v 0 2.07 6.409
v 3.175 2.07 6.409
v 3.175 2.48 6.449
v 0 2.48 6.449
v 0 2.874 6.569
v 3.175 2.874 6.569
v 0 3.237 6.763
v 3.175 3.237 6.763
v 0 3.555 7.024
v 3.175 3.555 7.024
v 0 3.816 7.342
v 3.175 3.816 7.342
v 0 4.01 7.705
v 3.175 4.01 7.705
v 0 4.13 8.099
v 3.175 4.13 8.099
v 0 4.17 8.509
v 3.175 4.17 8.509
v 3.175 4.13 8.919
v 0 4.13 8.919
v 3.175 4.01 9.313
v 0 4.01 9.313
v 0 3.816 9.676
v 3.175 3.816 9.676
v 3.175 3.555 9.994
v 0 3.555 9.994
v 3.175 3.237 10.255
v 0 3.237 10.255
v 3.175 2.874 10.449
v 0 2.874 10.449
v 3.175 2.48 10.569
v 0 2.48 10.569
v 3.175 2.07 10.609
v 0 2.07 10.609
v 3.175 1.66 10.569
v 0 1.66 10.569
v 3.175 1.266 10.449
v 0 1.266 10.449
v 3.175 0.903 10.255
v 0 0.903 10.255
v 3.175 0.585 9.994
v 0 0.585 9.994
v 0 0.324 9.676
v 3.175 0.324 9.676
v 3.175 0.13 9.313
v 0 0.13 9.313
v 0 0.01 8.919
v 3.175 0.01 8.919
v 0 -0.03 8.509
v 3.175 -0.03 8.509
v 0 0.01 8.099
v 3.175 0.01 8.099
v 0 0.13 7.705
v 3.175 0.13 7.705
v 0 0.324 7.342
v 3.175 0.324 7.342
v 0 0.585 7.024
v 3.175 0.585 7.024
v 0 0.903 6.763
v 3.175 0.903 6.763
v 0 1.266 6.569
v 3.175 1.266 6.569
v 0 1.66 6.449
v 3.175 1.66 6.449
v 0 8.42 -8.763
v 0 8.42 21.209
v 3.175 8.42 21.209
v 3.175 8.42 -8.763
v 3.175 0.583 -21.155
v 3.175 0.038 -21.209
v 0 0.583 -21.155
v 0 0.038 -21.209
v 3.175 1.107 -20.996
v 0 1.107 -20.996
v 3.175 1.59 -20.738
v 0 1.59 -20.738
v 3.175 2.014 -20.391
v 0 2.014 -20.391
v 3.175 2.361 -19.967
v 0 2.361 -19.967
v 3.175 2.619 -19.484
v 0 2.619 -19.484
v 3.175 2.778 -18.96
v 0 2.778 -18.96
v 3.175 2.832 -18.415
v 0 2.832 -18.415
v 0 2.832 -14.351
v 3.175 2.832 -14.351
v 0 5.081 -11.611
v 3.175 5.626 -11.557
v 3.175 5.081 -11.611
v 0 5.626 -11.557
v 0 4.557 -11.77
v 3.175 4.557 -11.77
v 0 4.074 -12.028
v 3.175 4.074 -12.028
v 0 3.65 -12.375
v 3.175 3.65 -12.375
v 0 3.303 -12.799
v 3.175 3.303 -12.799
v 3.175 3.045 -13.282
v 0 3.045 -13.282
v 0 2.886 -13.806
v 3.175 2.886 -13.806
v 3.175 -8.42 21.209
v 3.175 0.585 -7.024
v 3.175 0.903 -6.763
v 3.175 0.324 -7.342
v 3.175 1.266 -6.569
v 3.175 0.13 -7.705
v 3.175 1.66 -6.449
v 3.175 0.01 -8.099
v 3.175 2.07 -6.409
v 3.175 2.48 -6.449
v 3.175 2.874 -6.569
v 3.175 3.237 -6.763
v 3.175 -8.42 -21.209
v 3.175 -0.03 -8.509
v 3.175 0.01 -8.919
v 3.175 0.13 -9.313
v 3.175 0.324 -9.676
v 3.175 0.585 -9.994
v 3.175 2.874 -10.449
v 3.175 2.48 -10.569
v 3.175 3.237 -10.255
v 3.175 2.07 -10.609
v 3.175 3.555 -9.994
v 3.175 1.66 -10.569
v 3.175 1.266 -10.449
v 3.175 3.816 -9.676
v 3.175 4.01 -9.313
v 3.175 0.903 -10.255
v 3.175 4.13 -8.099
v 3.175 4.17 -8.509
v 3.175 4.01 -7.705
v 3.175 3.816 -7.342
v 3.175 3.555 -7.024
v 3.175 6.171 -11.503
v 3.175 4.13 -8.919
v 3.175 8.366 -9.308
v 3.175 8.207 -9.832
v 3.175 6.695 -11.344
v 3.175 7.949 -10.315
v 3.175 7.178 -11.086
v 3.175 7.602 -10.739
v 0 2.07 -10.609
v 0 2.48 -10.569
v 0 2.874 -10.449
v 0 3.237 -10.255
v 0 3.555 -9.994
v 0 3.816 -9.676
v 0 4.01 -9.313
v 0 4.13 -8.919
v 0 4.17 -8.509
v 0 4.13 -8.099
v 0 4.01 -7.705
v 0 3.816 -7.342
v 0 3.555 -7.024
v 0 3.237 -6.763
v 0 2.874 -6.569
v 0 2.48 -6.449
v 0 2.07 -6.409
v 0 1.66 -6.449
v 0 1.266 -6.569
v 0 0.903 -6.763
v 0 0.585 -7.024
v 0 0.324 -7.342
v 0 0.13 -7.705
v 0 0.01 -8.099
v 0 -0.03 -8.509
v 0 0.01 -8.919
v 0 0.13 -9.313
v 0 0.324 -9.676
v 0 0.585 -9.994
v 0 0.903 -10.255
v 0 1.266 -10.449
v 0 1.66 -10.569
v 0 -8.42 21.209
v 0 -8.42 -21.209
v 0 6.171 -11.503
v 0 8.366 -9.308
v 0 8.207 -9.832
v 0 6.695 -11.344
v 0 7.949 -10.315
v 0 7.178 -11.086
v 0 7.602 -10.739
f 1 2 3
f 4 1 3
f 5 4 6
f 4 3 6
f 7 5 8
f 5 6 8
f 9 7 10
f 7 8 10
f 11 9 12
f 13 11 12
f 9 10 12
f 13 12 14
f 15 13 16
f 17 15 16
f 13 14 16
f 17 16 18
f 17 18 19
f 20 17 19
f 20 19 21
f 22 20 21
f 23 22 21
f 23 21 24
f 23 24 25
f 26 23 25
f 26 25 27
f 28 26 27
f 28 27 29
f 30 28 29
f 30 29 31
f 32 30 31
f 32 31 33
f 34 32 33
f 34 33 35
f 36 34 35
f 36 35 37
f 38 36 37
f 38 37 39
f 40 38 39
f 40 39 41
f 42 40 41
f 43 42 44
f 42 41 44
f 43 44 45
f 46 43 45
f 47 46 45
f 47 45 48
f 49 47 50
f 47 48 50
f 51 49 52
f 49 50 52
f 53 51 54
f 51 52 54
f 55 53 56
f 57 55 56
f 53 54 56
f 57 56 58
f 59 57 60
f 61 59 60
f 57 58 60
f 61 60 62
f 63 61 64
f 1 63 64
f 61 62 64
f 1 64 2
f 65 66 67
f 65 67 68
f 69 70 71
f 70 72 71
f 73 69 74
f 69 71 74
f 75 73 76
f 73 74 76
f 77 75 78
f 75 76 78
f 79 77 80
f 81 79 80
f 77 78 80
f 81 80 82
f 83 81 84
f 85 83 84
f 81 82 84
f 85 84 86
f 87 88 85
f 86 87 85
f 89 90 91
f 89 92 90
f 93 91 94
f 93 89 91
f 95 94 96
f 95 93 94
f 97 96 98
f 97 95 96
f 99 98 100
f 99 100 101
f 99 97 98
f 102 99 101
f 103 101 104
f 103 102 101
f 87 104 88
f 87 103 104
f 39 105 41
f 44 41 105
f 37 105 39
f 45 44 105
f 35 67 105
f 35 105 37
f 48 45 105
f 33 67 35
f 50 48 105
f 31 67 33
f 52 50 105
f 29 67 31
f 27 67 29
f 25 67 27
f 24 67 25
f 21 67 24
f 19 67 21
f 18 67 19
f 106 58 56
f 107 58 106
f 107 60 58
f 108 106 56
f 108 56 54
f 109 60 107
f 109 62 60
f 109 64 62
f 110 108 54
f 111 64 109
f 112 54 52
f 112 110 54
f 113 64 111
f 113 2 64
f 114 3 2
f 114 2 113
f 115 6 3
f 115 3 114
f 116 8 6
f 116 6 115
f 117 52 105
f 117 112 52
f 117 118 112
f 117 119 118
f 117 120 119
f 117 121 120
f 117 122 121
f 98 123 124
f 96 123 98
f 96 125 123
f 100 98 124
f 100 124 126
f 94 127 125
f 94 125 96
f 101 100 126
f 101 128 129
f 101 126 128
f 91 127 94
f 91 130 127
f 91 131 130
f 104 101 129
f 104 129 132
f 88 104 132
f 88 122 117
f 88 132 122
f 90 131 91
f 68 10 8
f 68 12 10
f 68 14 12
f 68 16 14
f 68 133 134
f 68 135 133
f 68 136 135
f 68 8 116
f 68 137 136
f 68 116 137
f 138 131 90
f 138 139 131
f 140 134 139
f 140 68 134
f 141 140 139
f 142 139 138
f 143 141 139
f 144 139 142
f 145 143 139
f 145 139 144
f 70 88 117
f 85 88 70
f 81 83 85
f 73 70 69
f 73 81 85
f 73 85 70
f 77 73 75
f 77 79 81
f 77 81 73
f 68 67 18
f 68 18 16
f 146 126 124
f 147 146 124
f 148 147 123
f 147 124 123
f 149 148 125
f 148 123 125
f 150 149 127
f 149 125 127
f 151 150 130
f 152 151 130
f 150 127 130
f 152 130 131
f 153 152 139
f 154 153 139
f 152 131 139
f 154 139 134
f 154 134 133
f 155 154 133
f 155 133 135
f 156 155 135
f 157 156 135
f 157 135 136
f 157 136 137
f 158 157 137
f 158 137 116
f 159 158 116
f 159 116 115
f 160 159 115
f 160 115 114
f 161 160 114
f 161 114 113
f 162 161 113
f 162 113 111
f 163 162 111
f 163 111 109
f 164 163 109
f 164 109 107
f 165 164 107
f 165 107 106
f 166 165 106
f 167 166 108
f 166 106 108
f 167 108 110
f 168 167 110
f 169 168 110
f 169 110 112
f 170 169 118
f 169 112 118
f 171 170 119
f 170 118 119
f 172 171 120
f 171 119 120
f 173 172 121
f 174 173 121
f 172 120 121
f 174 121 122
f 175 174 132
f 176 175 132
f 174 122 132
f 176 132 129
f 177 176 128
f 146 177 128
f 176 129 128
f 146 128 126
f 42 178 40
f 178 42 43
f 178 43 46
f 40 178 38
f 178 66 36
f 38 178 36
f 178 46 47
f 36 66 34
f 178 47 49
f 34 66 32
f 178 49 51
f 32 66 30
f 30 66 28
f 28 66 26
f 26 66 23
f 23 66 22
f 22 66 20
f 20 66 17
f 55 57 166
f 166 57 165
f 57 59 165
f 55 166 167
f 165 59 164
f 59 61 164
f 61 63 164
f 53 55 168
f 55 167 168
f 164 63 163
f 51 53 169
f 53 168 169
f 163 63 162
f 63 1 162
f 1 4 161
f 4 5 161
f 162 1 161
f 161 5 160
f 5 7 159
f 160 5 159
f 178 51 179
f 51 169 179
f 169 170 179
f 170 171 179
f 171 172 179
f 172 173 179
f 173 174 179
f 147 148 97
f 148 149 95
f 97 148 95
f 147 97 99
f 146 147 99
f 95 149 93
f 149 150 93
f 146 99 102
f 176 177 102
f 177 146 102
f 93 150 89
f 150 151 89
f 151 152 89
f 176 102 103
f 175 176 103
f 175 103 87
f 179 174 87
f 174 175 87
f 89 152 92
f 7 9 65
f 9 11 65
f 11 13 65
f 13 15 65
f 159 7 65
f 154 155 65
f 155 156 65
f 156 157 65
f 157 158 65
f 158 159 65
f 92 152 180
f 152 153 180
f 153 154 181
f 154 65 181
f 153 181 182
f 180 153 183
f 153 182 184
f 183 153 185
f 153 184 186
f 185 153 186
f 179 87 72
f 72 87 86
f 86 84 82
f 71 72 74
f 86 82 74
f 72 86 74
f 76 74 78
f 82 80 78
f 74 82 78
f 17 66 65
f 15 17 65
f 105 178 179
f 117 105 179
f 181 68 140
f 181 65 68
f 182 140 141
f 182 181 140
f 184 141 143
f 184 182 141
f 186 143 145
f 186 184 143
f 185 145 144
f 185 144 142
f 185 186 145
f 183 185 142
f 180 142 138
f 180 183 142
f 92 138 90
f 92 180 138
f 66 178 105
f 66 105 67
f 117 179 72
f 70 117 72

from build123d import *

# Parameters (mm, degrees)
SKETCH1_W           = 42.418
SKETCH1_H           = 16.8402
BOSS_EXTRUDE1_DEPTH = 3.175
SKETCH3_R           = 2.1
CUT_EXTRUDE1_DEPTH  = 24.039105669
SKETCH4_W           = 9.652
SKETCH4_H           = 5.588
CUT_EXTRUDE2_DEPTH  = 24.039105669
FILLET1_R           = 2.794


with BuildPart() as part:
    # Sketch1 → Boss-Extrude1 (new body)
    with BuildSketch(Plane(origin=(0, 0, 0), x_dir=(0, 0, -1), z_dir=(1, 0, 0))):
        Rectangle(SKETCH1_W, SKETCH1_H)
    extrude(amount=BOSS_EXTRUDE1_DEPTH)

    # Sketch3 → Cut-Extrude1 (cut, through all)
    with BuildSketch(Plane(origin=(3.175, 0, 0), x_dir=(0, 0, -1), z_dir=(1, 0, 0))):
        with Locations((-8.509, 2.0701)):
            Circle(SKETCH3_R)
        with Locations((8.509, 2.0701)):
            Circle(SKETCH3_R)
    extrude(amount=-CUT_EXTRUDE1_DEPTH, mode=Mode.SUBTRACT)

    # Sketch4 → Cut-Extrude2 (cut, through all)
    with BuildSketch(Plane(origin=(3.175, 0, 0), x_dir=(0, 0, -1), z_dir=(1, 0, 0))):
        with Locations((16.383, 5.6261)):
            Rectangle(SKETCH4_W, SKETCH4_H)
    extrude(amount=-CUT_EXTRUDE2_DEPTH, mode=Mode.SUBTRACT)

    # Fillet1
    fillet1_edges = [part.edges().sort_by_distance(p)[0] for p in [
        (1.5875, 2.8321, -21.209),
        (1.5875, 8.4201, -11.557),
        (1.5875, 2.8321, -11.557),
    ]]
    fillet(fillet1_edges, radius=FILLET1_R - 0.0001)  # a hair under: the kernel refuses the full size


solid = part.part
